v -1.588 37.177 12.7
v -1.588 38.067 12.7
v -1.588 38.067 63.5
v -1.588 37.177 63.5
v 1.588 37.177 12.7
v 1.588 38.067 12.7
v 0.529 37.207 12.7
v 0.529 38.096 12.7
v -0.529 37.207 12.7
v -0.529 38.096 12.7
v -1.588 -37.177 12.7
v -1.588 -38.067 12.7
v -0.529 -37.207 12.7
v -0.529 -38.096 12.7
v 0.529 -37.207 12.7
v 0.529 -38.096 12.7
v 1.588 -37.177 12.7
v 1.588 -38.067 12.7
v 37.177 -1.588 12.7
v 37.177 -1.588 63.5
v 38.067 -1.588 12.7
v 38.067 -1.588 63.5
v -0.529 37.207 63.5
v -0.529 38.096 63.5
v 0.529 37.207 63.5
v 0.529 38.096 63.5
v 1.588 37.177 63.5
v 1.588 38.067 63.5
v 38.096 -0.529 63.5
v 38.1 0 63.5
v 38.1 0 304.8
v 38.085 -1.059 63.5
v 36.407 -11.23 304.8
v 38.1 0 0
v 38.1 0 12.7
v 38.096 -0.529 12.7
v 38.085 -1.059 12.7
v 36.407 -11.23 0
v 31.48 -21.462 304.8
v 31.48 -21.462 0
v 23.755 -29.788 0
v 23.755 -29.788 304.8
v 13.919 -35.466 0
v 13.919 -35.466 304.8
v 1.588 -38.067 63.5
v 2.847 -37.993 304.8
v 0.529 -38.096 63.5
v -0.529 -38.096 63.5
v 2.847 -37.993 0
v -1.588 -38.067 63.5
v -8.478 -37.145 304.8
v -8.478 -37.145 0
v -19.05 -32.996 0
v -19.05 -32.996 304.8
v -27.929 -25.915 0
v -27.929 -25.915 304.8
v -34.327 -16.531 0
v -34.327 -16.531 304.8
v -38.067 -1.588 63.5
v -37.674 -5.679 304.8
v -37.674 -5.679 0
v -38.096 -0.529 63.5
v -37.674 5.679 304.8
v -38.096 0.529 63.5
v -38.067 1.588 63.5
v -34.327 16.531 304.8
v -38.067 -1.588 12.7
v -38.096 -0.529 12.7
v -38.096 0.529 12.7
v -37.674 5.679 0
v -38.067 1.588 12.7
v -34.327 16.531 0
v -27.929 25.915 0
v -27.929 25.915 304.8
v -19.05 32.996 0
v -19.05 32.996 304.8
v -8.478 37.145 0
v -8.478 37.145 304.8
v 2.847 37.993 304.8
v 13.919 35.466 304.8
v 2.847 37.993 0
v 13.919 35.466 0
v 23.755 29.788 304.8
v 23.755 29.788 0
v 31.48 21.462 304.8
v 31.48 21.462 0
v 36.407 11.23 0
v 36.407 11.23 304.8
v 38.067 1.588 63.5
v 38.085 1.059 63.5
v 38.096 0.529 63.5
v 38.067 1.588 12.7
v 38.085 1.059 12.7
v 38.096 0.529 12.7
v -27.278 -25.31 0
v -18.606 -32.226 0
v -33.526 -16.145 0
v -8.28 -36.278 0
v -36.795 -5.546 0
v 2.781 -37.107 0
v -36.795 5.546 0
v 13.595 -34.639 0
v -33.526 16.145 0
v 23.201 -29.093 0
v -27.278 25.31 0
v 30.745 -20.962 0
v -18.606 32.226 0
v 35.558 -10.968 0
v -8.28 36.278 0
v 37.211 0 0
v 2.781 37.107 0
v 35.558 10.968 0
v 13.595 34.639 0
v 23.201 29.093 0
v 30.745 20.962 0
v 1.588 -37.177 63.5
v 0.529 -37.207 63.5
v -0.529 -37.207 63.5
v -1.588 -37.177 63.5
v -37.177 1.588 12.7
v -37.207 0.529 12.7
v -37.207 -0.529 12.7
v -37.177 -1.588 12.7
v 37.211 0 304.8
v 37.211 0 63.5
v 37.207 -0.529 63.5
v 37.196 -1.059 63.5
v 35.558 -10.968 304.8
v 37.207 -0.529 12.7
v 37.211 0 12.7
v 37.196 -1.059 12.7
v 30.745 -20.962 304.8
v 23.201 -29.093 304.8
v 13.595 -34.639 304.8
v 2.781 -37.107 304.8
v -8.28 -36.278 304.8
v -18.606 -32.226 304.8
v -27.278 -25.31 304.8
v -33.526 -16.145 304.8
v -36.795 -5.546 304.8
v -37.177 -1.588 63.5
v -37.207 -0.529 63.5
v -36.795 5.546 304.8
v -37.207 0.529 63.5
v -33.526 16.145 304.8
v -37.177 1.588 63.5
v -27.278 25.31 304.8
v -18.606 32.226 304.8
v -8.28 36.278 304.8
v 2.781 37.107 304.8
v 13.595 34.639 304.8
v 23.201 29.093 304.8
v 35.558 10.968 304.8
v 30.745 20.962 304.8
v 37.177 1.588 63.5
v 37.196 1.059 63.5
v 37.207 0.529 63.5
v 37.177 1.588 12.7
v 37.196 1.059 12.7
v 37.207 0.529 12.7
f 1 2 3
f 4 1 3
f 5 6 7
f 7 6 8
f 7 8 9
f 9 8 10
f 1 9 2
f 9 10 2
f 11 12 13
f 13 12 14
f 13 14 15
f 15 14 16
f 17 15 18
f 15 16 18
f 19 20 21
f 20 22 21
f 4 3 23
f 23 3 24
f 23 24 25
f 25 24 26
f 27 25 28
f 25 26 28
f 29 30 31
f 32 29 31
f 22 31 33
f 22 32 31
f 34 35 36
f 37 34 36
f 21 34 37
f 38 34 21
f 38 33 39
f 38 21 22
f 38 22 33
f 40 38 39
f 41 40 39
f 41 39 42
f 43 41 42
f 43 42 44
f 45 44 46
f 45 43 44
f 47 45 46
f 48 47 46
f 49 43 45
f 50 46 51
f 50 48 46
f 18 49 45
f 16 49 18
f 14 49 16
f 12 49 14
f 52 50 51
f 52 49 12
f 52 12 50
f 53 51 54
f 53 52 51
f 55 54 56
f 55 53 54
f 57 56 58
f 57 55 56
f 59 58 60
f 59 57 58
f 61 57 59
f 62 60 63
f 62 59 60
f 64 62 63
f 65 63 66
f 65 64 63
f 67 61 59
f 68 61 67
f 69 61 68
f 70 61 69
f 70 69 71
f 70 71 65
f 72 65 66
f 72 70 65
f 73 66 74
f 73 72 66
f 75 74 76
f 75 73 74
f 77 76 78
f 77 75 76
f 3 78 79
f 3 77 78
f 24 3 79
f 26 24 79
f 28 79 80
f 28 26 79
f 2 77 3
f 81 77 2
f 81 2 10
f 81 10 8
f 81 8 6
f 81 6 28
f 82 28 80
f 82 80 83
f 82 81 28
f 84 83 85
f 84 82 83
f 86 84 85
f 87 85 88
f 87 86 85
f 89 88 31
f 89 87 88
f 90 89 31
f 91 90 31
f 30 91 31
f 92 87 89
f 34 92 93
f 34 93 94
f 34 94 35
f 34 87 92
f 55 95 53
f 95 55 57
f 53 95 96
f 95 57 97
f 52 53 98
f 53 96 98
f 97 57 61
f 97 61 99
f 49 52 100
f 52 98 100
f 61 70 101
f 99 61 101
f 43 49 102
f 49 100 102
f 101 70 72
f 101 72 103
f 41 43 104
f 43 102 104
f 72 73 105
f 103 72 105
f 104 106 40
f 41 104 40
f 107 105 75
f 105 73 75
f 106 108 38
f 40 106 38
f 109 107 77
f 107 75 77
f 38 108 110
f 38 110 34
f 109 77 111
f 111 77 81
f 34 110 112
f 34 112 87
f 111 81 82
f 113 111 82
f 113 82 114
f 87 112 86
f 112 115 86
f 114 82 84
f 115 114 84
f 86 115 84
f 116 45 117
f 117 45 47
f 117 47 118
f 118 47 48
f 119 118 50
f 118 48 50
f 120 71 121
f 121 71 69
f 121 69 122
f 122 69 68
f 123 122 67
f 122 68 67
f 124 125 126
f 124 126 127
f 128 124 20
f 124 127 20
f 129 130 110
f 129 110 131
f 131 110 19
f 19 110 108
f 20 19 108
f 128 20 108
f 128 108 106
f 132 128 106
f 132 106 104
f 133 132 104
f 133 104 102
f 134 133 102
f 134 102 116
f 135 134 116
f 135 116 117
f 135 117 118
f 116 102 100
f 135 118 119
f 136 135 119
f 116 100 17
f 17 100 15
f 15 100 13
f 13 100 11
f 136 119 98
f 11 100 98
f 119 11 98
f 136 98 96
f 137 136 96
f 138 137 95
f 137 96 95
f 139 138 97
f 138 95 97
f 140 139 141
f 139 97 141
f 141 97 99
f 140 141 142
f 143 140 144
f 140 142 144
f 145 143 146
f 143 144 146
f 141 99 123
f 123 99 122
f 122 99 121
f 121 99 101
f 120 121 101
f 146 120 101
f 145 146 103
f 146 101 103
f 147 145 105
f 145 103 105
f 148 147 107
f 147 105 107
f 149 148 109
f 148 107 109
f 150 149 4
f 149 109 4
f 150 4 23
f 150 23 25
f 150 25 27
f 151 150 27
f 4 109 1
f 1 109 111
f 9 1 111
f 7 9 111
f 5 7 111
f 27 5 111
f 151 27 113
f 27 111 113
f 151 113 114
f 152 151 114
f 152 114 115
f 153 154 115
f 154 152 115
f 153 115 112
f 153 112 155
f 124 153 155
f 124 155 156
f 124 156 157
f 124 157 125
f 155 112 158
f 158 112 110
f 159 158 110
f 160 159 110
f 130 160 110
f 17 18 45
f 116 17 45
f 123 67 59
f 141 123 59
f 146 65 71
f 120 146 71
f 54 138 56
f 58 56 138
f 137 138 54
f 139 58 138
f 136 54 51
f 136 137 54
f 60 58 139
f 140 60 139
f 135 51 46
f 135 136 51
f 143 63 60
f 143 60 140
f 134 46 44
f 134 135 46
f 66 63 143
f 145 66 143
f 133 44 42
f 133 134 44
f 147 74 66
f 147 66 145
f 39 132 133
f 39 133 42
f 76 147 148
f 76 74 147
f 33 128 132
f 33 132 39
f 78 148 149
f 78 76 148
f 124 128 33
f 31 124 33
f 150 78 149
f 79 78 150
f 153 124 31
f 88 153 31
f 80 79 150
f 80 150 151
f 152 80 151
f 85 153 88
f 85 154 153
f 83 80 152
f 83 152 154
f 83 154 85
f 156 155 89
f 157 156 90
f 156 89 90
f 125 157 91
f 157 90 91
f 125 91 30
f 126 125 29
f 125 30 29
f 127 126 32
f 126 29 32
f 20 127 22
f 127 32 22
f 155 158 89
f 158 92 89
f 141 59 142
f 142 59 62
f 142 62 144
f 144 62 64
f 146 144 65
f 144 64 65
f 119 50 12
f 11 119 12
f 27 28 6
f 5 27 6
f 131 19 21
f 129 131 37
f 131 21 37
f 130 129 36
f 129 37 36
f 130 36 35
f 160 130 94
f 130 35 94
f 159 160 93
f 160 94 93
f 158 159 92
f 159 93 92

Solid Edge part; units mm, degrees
sketch "Sketch1" plane through (0, 0, 0) normal (0, 0, 1) x (1, 0, 0)
  circle A0 centre (0, 0) radius 38.1
  circle A1 centre (0, 0) radius 37.211
  dimension "D1" = 76.2
  dimension "D2" = 74.422
extrude "Protrusion1" add sketch "Sketch1" along normal blind 304.8
sketch "Sketch2" plane through (-38.1, 0, 152.4) normal (-1, 0, 0) x (0, 0, -1)
  line L0 (88.9, 1.5875) -> (88.9, -1.5875)
  line L1 (88.9, -1.5875) -> (139.7, -1.5875)
  line L2 (139.7, -1.5875) -> (139.7, 1.5875)
  line L3 (139.7, 1.5875) -> (88.9, 1.5875)
extrude "ExtrudedCutout_1" cut sketch "Sketch2" against normal blind 12.7
pattern_circular "Pattern1" count 4 over 360 about axis through (0, 0, 0) along (0, 0, -1) of "ExtrudedCutout_1"
